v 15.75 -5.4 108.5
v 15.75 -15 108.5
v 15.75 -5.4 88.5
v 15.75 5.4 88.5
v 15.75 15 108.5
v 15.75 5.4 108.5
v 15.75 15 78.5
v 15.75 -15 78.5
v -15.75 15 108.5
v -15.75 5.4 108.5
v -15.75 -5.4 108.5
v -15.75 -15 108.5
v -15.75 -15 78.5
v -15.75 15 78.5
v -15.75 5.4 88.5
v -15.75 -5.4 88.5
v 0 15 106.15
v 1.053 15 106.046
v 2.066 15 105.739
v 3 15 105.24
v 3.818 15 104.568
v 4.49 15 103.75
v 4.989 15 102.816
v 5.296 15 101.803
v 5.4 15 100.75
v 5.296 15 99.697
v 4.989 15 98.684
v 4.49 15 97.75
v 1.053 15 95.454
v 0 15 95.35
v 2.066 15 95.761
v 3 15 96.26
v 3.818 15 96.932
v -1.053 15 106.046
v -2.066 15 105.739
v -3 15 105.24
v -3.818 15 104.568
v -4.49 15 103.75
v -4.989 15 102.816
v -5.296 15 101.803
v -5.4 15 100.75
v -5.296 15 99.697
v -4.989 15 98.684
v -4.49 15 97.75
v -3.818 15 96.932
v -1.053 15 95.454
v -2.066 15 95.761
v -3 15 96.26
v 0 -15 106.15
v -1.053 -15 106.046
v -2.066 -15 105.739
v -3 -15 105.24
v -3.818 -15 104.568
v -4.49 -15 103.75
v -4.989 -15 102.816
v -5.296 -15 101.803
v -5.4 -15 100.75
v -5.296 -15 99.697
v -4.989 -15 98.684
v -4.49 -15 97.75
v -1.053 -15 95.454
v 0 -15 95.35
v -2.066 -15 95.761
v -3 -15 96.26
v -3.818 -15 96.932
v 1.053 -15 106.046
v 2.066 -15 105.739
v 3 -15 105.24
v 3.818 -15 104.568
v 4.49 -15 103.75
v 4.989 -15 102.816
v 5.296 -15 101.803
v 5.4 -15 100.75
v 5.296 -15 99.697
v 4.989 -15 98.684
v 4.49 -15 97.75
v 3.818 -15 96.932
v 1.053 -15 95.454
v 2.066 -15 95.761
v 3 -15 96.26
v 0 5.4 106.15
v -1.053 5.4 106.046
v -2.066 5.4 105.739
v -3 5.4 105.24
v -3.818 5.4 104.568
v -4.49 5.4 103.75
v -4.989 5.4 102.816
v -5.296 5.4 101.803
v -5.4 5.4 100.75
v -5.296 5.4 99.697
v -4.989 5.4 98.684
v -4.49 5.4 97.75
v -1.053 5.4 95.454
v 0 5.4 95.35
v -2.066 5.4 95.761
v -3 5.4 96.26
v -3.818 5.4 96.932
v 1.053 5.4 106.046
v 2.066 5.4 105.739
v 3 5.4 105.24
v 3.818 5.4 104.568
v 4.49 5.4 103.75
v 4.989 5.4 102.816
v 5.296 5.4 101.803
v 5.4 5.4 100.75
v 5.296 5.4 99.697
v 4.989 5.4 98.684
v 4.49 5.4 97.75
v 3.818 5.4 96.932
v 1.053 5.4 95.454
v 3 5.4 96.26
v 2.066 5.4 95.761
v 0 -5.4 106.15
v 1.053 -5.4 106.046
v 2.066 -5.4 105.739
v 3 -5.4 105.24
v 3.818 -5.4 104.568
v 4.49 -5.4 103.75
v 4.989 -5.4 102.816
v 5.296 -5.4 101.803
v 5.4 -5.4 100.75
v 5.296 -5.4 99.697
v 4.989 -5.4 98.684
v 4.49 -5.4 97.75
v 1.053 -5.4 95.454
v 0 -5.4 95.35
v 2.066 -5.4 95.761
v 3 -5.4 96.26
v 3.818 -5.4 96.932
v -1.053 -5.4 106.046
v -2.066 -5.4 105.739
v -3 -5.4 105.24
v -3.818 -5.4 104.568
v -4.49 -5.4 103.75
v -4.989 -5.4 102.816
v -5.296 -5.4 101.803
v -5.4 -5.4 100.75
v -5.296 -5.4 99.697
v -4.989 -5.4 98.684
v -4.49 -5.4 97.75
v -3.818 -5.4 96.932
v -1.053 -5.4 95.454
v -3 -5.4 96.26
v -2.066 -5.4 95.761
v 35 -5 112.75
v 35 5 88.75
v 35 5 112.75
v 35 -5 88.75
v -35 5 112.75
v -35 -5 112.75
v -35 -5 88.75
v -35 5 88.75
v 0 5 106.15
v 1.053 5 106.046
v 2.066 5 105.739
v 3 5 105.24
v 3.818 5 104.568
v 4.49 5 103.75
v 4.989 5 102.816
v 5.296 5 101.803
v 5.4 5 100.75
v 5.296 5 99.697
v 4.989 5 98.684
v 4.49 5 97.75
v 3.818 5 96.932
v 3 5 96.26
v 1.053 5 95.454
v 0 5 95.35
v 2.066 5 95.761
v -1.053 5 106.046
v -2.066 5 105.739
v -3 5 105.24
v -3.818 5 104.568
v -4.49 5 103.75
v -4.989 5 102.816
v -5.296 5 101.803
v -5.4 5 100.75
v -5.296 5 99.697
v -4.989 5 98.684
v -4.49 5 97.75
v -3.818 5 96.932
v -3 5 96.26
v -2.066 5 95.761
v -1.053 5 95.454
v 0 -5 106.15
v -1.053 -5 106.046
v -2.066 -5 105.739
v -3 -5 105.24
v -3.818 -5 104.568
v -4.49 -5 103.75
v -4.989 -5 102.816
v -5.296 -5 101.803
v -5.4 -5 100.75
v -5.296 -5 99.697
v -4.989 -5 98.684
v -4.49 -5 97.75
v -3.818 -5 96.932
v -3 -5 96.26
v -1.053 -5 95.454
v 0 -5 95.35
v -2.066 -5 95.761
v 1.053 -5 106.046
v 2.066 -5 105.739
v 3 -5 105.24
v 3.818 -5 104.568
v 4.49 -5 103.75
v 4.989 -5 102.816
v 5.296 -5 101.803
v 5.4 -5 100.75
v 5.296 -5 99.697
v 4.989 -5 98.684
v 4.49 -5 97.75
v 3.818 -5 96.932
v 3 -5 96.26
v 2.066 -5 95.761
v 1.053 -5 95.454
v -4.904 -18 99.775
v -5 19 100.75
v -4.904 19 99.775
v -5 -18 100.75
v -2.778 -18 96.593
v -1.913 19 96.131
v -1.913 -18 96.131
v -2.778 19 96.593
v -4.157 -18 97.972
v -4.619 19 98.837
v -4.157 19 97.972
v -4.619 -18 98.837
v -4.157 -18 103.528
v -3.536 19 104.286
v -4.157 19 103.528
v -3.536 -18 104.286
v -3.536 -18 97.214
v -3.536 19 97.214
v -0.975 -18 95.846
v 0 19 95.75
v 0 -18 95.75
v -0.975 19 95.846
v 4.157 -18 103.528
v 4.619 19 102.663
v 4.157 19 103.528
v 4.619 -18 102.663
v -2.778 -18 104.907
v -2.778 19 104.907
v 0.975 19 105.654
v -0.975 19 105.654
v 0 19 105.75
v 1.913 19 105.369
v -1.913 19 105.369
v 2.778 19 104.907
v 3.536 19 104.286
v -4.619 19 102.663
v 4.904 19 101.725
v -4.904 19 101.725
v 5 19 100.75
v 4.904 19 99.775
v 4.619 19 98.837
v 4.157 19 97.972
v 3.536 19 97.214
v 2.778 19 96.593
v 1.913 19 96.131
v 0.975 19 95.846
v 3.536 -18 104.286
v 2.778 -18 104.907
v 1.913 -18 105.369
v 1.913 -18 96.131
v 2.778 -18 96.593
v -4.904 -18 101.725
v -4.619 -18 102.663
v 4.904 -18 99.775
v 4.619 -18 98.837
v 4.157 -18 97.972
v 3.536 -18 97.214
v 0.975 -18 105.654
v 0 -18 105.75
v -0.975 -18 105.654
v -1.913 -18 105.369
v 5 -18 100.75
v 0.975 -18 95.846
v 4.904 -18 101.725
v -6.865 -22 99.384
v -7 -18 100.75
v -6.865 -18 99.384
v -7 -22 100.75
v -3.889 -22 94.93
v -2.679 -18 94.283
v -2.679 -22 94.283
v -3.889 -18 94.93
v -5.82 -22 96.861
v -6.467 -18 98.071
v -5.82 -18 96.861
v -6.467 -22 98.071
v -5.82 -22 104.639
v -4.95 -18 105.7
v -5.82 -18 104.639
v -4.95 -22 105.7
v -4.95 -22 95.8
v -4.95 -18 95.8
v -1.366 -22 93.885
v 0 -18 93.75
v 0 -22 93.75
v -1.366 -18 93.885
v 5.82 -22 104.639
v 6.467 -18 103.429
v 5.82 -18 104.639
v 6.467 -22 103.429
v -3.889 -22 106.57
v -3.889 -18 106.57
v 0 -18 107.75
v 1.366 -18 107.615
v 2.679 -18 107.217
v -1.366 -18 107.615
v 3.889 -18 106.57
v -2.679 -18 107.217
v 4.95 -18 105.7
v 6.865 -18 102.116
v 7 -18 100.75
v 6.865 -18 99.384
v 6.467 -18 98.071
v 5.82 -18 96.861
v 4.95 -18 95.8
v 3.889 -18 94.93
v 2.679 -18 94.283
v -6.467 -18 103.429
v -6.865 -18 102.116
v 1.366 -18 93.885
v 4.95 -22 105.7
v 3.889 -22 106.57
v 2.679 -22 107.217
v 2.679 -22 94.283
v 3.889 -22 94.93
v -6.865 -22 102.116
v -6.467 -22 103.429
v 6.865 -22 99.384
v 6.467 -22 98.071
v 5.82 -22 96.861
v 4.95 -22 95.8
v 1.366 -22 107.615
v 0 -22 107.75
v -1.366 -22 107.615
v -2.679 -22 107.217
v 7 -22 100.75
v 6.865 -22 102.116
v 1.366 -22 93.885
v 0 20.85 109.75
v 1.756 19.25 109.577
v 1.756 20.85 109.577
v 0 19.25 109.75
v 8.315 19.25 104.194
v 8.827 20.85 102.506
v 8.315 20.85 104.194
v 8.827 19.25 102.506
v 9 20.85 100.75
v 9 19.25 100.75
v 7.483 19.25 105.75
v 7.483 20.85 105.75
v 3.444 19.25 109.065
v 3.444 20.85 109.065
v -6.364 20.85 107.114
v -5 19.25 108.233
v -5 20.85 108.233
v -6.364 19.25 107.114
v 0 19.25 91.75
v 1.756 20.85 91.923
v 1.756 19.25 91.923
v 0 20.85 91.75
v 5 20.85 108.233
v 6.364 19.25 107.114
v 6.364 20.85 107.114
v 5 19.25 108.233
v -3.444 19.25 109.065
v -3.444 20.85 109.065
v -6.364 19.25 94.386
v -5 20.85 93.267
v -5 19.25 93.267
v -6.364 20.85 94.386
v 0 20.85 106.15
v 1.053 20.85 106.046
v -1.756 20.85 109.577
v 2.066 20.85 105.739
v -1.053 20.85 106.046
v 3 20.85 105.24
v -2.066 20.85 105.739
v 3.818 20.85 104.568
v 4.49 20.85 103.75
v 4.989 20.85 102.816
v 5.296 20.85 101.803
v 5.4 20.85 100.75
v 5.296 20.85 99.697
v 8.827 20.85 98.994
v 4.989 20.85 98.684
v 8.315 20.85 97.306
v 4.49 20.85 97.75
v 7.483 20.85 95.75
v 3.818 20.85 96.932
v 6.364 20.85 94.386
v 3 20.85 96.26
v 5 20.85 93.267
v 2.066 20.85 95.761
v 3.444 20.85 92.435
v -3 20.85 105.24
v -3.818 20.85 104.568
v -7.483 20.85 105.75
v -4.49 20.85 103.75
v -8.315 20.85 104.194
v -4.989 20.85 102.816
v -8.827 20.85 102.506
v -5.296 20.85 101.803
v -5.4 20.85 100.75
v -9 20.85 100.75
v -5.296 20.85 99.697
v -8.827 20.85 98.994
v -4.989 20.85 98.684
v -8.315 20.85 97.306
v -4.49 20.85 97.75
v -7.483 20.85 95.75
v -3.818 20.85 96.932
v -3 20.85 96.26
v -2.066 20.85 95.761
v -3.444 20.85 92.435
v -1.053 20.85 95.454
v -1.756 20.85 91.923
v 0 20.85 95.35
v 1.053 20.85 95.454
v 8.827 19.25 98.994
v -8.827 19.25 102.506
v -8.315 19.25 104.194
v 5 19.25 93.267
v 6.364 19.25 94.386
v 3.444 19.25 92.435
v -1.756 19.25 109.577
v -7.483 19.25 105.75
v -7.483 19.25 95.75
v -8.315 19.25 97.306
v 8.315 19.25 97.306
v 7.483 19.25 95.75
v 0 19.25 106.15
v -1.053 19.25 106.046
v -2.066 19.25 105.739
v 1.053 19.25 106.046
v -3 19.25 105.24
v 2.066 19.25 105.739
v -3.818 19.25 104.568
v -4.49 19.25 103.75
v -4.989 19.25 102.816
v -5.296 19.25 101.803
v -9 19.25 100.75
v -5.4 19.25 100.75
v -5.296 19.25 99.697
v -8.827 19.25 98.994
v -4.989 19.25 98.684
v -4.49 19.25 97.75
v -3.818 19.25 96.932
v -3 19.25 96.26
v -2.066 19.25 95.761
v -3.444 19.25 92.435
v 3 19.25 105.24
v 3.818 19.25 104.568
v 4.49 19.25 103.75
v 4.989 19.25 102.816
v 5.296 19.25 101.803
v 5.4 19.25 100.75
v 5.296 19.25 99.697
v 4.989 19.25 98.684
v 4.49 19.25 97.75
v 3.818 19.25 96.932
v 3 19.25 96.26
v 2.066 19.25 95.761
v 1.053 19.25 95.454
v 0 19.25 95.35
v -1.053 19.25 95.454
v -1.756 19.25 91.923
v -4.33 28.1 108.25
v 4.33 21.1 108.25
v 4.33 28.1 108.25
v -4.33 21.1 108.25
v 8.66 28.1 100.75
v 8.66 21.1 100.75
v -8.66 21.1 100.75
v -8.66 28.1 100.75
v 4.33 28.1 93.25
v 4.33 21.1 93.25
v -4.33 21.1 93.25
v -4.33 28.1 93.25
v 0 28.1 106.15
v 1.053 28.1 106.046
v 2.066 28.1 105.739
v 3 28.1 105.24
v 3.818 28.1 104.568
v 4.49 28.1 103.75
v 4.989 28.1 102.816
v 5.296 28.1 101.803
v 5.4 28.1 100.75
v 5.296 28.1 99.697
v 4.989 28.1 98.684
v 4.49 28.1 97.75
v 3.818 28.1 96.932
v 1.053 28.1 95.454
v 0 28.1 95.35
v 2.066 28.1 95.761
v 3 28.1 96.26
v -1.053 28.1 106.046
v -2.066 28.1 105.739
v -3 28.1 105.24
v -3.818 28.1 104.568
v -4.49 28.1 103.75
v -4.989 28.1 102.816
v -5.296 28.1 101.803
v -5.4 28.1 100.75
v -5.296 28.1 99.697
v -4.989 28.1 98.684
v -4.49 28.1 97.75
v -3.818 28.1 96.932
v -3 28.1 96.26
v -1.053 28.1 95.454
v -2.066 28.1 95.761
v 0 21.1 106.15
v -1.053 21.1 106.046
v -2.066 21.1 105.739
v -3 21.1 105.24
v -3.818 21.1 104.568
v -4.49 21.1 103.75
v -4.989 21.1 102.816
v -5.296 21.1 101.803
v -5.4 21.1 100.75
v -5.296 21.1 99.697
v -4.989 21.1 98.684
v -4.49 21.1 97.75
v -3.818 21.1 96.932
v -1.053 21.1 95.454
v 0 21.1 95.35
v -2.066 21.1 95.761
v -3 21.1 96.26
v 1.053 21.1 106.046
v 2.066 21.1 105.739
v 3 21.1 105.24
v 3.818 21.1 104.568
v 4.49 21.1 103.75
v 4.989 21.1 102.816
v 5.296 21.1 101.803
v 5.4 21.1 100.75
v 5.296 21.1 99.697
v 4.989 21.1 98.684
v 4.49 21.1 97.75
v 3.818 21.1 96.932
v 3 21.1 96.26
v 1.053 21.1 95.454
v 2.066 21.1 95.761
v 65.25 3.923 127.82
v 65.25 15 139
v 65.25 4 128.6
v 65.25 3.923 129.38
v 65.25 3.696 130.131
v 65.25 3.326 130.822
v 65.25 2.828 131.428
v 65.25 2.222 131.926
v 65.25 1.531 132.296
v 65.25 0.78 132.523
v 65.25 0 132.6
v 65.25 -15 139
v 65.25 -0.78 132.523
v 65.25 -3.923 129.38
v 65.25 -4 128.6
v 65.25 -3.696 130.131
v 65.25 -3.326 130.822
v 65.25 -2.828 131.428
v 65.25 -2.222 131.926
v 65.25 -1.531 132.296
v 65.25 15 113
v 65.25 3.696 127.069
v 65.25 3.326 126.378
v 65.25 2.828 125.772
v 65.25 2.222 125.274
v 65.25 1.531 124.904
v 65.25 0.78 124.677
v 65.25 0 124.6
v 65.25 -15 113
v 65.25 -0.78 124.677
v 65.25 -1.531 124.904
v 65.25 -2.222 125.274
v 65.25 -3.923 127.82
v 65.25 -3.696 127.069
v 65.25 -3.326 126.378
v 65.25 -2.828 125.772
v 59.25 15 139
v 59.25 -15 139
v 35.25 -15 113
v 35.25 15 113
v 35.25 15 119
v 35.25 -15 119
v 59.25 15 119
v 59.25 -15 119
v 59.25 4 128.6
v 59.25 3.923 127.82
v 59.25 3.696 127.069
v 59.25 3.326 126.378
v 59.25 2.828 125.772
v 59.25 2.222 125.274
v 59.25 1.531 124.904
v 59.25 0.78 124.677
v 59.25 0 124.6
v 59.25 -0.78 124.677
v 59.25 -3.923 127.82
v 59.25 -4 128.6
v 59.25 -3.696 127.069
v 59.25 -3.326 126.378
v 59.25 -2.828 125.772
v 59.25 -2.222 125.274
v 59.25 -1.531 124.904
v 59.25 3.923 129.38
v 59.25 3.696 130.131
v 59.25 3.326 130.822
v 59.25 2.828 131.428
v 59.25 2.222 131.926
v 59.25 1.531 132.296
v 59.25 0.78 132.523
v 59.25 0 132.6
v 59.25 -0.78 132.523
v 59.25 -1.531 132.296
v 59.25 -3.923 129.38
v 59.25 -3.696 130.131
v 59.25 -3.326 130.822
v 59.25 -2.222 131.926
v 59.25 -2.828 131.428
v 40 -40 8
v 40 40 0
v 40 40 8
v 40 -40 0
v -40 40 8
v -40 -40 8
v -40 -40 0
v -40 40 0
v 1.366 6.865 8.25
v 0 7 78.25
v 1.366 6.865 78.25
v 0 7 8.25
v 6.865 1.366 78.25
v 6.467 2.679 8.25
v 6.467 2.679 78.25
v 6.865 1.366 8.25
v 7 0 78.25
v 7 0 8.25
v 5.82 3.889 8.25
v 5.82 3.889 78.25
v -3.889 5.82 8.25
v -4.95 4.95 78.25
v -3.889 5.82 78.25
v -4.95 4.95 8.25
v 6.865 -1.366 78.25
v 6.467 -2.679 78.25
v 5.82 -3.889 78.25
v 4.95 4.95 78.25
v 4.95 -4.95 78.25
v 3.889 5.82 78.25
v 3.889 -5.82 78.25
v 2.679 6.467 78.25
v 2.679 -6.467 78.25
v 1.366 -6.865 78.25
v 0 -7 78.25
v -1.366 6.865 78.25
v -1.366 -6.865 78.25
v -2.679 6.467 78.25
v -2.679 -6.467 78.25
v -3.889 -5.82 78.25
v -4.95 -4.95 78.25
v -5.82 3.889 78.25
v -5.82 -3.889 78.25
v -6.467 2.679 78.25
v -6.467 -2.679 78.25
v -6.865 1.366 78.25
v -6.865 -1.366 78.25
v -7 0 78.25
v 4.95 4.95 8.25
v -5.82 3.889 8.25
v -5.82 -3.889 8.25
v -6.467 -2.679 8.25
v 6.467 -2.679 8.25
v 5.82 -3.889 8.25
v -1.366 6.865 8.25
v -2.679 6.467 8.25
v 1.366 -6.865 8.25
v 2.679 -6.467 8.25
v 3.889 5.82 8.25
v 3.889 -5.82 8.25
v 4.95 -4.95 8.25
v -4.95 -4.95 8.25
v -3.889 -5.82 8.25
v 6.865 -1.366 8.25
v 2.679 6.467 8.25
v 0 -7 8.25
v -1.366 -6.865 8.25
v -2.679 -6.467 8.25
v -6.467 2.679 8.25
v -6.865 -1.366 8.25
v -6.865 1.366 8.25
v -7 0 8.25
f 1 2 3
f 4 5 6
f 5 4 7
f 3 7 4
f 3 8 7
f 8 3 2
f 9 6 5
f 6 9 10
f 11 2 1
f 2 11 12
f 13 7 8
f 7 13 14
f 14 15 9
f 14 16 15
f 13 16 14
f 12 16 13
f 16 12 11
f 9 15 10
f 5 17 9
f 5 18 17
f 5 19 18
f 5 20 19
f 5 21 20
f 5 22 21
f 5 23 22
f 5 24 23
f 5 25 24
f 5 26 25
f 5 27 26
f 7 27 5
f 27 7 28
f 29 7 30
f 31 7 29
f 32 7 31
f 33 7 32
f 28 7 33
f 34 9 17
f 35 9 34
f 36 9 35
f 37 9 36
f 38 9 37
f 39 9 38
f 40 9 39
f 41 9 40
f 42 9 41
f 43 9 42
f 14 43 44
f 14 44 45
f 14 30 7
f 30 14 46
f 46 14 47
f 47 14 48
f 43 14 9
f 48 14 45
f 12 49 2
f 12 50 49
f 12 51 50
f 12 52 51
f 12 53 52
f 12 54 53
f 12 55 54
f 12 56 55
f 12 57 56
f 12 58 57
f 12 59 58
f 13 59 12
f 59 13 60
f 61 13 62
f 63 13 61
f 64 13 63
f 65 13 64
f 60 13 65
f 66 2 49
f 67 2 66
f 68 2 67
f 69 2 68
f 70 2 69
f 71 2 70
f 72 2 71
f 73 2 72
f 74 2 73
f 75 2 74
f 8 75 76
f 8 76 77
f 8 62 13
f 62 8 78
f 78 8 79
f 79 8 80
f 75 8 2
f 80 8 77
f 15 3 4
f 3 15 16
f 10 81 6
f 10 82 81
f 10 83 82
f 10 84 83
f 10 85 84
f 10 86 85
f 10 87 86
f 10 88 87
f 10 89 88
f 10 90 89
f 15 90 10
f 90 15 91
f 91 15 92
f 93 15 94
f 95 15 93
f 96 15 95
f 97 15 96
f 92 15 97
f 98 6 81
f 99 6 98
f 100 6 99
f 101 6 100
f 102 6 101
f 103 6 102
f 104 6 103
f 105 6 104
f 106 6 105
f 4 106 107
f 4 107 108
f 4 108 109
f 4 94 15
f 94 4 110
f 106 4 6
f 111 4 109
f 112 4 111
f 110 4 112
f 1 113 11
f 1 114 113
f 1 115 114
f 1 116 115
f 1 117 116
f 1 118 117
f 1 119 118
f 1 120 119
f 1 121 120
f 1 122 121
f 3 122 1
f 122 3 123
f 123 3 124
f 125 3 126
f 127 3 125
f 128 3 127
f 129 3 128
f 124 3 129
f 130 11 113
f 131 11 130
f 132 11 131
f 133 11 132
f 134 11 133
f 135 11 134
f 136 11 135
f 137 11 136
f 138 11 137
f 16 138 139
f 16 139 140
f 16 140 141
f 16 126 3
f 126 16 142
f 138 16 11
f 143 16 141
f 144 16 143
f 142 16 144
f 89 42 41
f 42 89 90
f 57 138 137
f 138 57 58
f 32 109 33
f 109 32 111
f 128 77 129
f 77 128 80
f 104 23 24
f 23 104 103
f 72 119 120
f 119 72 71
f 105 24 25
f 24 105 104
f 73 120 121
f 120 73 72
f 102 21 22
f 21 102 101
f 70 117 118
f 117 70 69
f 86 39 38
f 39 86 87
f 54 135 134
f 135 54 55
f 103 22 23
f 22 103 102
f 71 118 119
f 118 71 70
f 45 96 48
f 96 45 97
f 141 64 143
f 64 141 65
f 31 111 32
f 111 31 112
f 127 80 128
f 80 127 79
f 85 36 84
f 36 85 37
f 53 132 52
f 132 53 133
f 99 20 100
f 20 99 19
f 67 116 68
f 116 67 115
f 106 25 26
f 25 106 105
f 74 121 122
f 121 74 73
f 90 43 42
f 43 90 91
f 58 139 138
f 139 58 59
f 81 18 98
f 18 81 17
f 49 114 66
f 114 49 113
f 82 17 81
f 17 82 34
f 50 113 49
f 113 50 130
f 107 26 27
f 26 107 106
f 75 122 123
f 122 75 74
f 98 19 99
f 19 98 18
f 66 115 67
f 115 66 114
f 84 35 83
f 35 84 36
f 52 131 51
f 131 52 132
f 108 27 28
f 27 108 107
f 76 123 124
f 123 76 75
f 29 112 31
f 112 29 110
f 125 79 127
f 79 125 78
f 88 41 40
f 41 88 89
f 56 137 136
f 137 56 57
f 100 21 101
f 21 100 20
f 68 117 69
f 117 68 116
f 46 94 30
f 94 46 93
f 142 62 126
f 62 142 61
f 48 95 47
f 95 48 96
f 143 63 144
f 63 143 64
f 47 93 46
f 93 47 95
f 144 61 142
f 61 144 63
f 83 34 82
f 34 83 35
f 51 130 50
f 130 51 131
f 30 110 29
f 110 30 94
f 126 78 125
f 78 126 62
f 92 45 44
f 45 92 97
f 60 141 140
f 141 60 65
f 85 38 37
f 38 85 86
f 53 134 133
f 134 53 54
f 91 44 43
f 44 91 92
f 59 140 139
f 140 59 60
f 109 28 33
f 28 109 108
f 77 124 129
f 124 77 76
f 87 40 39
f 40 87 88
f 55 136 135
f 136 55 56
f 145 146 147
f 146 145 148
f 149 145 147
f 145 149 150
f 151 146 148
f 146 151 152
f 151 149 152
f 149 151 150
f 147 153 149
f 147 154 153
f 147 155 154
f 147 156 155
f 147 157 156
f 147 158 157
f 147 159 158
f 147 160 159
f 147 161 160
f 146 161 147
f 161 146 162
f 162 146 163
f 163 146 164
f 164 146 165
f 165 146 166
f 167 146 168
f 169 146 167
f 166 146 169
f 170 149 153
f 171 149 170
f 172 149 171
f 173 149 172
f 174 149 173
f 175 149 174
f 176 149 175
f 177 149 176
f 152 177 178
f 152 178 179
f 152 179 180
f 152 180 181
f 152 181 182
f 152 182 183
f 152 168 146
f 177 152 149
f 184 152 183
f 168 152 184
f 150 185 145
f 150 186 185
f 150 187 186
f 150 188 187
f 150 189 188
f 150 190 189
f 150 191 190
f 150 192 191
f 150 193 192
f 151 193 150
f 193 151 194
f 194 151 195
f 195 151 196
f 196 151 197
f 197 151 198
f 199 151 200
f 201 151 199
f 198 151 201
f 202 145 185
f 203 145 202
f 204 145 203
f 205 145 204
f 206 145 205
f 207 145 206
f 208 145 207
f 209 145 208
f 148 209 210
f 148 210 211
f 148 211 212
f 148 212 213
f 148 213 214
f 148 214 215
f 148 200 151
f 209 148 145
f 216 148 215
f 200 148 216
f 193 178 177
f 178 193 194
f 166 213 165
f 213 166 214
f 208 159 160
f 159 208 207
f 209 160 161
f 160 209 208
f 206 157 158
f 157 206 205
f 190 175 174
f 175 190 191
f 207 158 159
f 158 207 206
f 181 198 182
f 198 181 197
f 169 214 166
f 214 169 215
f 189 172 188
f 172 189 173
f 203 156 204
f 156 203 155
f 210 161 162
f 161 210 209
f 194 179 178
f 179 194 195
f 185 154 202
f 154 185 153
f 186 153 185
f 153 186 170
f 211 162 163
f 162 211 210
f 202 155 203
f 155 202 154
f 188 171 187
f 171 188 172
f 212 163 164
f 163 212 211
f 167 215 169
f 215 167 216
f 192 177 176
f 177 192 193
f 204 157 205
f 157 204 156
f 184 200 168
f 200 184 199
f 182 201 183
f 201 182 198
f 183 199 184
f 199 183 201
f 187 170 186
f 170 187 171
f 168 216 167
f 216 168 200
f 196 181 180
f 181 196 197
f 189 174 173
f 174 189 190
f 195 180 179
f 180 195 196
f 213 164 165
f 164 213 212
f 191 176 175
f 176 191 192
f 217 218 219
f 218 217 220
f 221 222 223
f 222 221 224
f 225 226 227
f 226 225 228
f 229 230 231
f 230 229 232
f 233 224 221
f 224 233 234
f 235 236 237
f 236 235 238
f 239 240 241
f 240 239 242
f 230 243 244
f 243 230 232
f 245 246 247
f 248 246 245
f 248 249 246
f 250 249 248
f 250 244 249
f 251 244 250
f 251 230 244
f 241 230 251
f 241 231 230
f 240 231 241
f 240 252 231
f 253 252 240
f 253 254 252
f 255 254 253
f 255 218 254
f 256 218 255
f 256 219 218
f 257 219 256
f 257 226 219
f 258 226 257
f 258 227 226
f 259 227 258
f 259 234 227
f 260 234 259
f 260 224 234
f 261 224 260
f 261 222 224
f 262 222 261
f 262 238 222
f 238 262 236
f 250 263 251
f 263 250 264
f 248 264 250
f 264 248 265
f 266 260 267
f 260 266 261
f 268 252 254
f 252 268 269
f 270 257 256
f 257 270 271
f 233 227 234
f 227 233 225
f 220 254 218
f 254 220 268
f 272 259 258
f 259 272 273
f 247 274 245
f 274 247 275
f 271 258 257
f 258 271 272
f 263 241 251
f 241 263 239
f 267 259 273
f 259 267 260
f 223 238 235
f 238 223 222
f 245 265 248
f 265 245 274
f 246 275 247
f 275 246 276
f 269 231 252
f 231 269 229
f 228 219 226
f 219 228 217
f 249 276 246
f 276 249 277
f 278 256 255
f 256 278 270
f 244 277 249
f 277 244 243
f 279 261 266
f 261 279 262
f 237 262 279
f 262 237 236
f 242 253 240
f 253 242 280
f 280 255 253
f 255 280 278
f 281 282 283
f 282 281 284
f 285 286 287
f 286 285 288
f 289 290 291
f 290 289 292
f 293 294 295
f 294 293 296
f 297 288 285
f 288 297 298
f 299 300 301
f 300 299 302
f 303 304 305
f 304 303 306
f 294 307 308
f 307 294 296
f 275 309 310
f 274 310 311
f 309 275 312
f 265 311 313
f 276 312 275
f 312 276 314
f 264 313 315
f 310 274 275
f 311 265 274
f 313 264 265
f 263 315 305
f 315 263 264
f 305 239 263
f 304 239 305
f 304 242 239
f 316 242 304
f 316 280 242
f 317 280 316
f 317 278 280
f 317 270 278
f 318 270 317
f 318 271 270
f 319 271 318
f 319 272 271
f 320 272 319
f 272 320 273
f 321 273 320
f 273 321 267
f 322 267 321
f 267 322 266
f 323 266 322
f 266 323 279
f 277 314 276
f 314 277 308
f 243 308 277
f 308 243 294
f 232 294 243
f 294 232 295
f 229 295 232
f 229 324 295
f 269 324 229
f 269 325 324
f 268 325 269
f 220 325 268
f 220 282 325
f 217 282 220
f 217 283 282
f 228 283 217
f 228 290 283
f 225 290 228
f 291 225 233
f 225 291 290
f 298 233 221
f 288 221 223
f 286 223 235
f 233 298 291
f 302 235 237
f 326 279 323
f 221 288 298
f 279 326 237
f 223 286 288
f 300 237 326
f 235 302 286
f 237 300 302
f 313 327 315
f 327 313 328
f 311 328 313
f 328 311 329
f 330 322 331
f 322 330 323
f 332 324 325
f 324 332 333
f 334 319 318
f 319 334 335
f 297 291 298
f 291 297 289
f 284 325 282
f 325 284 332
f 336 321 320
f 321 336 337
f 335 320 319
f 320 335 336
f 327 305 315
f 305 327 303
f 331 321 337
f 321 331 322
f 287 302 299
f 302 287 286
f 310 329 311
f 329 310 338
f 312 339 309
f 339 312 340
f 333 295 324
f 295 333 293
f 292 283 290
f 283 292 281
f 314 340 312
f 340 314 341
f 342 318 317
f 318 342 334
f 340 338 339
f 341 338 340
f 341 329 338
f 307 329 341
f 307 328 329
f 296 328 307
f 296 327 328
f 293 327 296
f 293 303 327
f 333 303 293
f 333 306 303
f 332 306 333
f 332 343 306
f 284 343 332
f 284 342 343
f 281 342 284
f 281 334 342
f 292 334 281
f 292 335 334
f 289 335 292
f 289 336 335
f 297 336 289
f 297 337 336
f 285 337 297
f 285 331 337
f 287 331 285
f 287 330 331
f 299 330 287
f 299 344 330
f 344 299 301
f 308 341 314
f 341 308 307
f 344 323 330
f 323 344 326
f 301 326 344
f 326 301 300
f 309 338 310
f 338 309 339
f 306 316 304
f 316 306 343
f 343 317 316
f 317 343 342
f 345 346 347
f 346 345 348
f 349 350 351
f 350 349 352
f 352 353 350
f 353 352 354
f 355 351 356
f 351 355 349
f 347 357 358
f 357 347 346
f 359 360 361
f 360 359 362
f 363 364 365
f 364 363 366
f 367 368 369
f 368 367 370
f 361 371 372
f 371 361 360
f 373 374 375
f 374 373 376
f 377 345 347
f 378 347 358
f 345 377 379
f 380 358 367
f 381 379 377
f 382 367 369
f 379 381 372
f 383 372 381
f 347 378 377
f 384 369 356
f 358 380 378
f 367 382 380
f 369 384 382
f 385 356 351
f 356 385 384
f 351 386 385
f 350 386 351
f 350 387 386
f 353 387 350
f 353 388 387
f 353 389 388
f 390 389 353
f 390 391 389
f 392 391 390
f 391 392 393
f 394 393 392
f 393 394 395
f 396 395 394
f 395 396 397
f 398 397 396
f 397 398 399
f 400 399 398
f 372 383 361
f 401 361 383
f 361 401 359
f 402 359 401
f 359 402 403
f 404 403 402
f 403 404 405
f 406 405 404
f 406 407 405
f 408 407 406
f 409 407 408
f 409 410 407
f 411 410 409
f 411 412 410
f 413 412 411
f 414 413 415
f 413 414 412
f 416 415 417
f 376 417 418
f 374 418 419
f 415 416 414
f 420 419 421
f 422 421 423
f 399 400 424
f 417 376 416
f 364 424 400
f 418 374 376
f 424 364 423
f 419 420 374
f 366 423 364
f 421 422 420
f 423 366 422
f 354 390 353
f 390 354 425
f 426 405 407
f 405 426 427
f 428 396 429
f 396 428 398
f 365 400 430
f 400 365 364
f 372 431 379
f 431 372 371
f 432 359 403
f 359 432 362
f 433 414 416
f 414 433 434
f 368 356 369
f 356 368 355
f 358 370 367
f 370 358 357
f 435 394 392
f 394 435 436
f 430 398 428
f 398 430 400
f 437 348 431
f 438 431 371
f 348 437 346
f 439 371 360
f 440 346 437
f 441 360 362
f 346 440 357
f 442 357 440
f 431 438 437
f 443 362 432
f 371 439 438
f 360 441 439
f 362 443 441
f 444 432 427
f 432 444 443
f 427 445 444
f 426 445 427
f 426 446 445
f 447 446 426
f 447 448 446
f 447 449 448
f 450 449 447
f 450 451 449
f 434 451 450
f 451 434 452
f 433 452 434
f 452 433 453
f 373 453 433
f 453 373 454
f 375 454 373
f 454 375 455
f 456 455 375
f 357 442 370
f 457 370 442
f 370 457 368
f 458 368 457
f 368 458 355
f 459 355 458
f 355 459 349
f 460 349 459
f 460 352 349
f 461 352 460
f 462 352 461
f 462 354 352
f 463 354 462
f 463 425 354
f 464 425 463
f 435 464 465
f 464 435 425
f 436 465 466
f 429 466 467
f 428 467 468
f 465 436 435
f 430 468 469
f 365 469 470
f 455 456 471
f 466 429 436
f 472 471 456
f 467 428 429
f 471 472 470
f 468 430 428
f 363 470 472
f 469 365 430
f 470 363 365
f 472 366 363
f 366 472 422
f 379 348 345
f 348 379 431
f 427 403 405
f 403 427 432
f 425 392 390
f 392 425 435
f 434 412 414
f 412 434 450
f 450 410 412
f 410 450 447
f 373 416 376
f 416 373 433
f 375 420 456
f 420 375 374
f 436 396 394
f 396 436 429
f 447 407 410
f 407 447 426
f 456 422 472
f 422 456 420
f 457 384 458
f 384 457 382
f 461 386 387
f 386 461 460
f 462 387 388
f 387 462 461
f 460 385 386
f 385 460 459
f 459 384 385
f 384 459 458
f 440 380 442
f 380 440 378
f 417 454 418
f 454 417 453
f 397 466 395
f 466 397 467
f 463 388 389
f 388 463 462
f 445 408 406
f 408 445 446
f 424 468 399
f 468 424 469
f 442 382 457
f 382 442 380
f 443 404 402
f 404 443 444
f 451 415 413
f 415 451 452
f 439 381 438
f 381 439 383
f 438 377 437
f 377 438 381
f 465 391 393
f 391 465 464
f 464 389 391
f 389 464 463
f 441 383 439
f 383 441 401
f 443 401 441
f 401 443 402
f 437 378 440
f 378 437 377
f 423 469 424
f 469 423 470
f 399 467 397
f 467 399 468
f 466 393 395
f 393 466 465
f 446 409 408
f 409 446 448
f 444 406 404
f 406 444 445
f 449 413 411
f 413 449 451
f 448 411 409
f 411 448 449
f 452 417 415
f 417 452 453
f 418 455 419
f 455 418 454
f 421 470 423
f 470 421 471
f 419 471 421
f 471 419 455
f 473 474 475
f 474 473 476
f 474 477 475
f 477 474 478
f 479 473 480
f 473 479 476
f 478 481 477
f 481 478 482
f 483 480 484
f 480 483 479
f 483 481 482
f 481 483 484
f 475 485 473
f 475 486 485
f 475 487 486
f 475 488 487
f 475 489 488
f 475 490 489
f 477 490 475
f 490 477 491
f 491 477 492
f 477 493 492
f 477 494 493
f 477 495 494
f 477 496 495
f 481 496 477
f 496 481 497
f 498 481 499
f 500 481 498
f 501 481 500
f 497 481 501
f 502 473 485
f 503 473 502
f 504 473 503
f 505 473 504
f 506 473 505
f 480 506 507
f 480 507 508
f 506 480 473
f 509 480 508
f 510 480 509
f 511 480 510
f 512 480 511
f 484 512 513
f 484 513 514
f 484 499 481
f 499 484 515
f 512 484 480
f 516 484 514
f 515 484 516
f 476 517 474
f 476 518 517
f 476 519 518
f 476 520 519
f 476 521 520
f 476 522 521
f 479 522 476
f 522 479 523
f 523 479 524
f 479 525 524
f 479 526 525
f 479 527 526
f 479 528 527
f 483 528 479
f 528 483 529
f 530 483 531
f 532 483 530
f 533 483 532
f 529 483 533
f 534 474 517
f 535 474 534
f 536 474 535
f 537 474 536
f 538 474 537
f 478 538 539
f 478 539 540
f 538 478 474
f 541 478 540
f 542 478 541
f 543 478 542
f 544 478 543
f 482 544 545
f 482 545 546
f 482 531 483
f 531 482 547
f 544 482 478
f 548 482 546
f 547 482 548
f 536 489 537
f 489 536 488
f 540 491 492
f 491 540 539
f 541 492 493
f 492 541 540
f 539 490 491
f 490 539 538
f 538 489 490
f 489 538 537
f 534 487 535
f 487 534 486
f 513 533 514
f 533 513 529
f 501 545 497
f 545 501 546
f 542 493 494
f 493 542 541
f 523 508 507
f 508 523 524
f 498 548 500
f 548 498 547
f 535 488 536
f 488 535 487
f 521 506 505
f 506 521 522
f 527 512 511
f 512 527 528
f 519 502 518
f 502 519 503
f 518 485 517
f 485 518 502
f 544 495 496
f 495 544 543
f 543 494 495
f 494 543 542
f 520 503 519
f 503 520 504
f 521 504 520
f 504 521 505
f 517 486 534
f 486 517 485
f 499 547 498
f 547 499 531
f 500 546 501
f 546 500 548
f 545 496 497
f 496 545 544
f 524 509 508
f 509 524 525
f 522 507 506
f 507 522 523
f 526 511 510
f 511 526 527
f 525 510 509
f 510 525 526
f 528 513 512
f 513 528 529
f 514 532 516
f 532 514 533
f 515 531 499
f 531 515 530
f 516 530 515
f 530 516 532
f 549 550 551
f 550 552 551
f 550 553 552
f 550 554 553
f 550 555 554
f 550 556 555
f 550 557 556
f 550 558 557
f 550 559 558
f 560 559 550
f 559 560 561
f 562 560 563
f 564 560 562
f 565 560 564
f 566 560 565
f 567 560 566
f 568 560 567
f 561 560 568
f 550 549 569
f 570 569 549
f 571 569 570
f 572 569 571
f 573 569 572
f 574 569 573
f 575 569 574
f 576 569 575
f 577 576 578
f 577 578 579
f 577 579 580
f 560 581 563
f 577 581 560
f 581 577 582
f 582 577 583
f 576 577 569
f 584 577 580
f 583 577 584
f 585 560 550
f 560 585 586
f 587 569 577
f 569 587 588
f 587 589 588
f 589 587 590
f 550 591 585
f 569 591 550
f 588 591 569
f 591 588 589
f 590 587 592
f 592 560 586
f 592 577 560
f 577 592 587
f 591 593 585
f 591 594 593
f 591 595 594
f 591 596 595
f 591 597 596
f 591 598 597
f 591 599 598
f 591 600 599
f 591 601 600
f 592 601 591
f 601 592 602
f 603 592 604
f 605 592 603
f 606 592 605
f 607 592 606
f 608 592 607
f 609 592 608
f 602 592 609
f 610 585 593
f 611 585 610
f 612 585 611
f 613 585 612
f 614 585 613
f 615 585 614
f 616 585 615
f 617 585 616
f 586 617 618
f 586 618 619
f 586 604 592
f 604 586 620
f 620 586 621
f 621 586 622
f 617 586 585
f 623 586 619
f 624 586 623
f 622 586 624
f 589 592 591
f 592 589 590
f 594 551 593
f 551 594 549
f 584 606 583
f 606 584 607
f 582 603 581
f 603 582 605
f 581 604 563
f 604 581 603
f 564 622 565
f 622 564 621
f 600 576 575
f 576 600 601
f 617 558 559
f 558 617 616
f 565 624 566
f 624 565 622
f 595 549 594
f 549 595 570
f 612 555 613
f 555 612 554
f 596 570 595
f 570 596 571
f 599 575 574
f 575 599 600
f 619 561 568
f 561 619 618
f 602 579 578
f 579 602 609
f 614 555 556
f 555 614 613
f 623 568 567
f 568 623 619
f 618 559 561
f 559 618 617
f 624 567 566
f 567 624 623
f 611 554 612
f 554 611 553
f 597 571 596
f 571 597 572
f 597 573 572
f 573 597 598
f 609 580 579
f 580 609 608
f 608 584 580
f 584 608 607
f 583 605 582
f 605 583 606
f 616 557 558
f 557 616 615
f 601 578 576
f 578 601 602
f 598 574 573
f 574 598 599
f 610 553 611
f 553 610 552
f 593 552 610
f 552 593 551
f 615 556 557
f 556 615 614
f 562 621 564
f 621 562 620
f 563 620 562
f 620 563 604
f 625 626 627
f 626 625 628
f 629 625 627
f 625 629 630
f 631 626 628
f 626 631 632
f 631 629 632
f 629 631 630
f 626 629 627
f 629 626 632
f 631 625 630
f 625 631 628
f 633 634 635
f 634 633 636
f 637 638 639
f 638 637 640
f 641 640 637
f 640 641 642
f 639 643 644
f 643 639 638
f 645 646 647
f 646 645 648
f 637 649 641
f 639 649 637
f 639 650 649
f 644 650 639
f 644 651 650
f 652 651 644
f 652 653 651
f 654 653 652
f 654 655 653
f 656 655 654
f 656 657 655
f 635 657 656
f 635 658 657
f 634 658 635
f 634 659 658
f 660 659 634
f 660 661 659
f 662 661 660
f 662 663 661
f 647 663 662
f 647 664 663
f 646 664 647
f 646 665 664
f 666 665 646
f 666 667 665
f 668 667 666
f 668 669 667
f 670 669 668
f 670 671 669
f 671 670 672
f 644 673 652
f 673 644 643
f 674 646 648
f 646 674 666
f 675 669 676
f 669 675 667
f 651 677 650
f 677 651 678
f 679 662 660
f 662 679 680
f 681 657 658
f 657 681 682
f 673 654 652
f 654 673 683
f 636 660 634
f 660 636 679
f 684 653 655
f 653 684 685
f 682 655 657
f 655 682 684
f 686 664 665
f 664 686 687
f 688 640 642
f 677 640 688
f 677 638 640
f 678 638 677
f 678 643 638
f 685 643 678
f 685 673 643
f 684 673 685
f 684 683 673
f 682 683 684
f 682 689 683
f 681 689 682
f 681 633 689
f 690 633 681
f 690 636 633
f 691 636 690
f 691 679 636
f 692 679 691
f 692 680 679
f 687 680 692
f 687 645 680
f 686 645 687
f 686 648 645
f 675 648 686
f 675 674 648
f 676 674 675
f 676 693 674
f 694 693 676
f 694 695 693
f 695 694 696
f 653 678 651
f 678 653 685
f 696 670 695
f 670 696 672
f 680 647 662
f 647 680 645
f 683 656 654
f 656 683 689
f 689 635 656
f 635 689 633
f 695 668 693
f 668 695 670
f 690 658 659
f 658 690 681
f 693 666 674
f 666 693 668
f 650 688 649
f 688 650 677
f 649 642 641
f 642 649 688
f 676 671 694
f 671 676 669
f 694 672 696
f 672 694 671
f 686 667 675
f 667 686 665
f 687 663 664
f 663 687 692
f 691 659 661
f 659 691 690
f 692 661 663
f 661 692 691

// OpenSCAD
$fn = 32;

// ------------------------------------------------------------------------
// Lamp arm: column d14 x 70 mm, arm 70 mm
// Every part is its own module, assembly() places every instance.
// ------------------------------------------------------------------------

// --- part 1 ---
module lamp_base() {
  difference() {
    translate([-40, -40, 0]) cube([80, 80, 8]);
  }
}

// --- part 2 ---
module lamp_column() {
  cylinder(h = 70, d = 14);
}

// --- part 3 ---
module head_fork() {
  difference() {
    translate([-15.75, -15, 0]) cube([31.5, 30, 30]);
    translate([-16.75, -5.4, 10]) cube([33.5, 10.8, 21]);
    translate([0, 0, 22.25]) rotate([90, 0, 0]) cylinder(h = 32, d = 10.8, center = true);
  }
}

// --- part 4 ---
module lamp_arm() {
  difference() {
    translate([-35, -5, 0]) cube([70, 10, 24]);
    translate([0, 0, 12]) rotate([90, 0, 0]) cylinder(h = 12, d = 10.8, center = true);
  }
}

// --- part 5 ---
module arm_pin() {
  rotate([0, 90, 0]) cylinder(h = 38, d = 10, center = true);
  translate([-22, 0, 0]) rotate([0, 90, 0]) cylinder(h = 4, d = 14);
}

// --- part 6 ---
module arm_washer() {
  difference() {
      translate([0, 0, 0]) cylinder(h = 1.6, d = 18);
      translate([0, 0, -1]) cylinder(h = 3.6, d = 10.8);
    }
}

// --- part 7 ---
module arm_nut() {
  difference() {
    linear_extrude(height = 7) polygon(points = [[8.66, 0], [4.33, 7.5], [-4.33, 7.5], [-8.66, 0], [-4.33, -7.5], [4.33, -7.5]]);
    translate([0, 0, -1]) cylinder(h = 9, d = 10.8);
  }
}

// --- part 8 ---
module shade_bracket() {
  difference() {
    translate([-15, -15, 0]) cube([30, 30, 26]);
    translate([-16, -16, 6]) cube([25, 32, 21]);
    translate([12, 0, 15.6]) rotate([0, 90, 0]) cylinder(h = 8, d = 8, center = true);
  }
}

// --- assembly ---
module assembly() {
  color([0.80, 0.24, 0.20]) translate([0, 0, 0]) rotate([0, 0, 0]) lamp_base();
  color([0.20, 0.45, 0.75]) translate([0, 0, 8.25]) rotate([0, 0, 0]) lamp_column();
  color([0.25, 0.62, 0.32]) translate([0, 0, 78.5]) rotate([0, 0, 0]) head_fork();
  color([0.92, 0.70, 0.18]) translate([0, 0, 88.75]) rotate([0, 0, 0]) lamp_arm();
  color([0.58, 0.35, 0.70]) translate([0, 0, 100.75]) rotate([0, 0, 90]) arm_pin();
  color([0.16, 0.66, 0.66]) translate([0, 20.85, 100.75]) rotate([90, 0, 0]) arm_washer();
  color([0.85, 0.48, 0.18]) translate([0, 28.1, 100.75]) rotate([90, 0, 0]) arm_nut();
  color([0.55, 0.60, 0.65]) translate([50.25, 0, 113]) rotate([0, 0, 0]) shade_bracket();
}

assembly();
